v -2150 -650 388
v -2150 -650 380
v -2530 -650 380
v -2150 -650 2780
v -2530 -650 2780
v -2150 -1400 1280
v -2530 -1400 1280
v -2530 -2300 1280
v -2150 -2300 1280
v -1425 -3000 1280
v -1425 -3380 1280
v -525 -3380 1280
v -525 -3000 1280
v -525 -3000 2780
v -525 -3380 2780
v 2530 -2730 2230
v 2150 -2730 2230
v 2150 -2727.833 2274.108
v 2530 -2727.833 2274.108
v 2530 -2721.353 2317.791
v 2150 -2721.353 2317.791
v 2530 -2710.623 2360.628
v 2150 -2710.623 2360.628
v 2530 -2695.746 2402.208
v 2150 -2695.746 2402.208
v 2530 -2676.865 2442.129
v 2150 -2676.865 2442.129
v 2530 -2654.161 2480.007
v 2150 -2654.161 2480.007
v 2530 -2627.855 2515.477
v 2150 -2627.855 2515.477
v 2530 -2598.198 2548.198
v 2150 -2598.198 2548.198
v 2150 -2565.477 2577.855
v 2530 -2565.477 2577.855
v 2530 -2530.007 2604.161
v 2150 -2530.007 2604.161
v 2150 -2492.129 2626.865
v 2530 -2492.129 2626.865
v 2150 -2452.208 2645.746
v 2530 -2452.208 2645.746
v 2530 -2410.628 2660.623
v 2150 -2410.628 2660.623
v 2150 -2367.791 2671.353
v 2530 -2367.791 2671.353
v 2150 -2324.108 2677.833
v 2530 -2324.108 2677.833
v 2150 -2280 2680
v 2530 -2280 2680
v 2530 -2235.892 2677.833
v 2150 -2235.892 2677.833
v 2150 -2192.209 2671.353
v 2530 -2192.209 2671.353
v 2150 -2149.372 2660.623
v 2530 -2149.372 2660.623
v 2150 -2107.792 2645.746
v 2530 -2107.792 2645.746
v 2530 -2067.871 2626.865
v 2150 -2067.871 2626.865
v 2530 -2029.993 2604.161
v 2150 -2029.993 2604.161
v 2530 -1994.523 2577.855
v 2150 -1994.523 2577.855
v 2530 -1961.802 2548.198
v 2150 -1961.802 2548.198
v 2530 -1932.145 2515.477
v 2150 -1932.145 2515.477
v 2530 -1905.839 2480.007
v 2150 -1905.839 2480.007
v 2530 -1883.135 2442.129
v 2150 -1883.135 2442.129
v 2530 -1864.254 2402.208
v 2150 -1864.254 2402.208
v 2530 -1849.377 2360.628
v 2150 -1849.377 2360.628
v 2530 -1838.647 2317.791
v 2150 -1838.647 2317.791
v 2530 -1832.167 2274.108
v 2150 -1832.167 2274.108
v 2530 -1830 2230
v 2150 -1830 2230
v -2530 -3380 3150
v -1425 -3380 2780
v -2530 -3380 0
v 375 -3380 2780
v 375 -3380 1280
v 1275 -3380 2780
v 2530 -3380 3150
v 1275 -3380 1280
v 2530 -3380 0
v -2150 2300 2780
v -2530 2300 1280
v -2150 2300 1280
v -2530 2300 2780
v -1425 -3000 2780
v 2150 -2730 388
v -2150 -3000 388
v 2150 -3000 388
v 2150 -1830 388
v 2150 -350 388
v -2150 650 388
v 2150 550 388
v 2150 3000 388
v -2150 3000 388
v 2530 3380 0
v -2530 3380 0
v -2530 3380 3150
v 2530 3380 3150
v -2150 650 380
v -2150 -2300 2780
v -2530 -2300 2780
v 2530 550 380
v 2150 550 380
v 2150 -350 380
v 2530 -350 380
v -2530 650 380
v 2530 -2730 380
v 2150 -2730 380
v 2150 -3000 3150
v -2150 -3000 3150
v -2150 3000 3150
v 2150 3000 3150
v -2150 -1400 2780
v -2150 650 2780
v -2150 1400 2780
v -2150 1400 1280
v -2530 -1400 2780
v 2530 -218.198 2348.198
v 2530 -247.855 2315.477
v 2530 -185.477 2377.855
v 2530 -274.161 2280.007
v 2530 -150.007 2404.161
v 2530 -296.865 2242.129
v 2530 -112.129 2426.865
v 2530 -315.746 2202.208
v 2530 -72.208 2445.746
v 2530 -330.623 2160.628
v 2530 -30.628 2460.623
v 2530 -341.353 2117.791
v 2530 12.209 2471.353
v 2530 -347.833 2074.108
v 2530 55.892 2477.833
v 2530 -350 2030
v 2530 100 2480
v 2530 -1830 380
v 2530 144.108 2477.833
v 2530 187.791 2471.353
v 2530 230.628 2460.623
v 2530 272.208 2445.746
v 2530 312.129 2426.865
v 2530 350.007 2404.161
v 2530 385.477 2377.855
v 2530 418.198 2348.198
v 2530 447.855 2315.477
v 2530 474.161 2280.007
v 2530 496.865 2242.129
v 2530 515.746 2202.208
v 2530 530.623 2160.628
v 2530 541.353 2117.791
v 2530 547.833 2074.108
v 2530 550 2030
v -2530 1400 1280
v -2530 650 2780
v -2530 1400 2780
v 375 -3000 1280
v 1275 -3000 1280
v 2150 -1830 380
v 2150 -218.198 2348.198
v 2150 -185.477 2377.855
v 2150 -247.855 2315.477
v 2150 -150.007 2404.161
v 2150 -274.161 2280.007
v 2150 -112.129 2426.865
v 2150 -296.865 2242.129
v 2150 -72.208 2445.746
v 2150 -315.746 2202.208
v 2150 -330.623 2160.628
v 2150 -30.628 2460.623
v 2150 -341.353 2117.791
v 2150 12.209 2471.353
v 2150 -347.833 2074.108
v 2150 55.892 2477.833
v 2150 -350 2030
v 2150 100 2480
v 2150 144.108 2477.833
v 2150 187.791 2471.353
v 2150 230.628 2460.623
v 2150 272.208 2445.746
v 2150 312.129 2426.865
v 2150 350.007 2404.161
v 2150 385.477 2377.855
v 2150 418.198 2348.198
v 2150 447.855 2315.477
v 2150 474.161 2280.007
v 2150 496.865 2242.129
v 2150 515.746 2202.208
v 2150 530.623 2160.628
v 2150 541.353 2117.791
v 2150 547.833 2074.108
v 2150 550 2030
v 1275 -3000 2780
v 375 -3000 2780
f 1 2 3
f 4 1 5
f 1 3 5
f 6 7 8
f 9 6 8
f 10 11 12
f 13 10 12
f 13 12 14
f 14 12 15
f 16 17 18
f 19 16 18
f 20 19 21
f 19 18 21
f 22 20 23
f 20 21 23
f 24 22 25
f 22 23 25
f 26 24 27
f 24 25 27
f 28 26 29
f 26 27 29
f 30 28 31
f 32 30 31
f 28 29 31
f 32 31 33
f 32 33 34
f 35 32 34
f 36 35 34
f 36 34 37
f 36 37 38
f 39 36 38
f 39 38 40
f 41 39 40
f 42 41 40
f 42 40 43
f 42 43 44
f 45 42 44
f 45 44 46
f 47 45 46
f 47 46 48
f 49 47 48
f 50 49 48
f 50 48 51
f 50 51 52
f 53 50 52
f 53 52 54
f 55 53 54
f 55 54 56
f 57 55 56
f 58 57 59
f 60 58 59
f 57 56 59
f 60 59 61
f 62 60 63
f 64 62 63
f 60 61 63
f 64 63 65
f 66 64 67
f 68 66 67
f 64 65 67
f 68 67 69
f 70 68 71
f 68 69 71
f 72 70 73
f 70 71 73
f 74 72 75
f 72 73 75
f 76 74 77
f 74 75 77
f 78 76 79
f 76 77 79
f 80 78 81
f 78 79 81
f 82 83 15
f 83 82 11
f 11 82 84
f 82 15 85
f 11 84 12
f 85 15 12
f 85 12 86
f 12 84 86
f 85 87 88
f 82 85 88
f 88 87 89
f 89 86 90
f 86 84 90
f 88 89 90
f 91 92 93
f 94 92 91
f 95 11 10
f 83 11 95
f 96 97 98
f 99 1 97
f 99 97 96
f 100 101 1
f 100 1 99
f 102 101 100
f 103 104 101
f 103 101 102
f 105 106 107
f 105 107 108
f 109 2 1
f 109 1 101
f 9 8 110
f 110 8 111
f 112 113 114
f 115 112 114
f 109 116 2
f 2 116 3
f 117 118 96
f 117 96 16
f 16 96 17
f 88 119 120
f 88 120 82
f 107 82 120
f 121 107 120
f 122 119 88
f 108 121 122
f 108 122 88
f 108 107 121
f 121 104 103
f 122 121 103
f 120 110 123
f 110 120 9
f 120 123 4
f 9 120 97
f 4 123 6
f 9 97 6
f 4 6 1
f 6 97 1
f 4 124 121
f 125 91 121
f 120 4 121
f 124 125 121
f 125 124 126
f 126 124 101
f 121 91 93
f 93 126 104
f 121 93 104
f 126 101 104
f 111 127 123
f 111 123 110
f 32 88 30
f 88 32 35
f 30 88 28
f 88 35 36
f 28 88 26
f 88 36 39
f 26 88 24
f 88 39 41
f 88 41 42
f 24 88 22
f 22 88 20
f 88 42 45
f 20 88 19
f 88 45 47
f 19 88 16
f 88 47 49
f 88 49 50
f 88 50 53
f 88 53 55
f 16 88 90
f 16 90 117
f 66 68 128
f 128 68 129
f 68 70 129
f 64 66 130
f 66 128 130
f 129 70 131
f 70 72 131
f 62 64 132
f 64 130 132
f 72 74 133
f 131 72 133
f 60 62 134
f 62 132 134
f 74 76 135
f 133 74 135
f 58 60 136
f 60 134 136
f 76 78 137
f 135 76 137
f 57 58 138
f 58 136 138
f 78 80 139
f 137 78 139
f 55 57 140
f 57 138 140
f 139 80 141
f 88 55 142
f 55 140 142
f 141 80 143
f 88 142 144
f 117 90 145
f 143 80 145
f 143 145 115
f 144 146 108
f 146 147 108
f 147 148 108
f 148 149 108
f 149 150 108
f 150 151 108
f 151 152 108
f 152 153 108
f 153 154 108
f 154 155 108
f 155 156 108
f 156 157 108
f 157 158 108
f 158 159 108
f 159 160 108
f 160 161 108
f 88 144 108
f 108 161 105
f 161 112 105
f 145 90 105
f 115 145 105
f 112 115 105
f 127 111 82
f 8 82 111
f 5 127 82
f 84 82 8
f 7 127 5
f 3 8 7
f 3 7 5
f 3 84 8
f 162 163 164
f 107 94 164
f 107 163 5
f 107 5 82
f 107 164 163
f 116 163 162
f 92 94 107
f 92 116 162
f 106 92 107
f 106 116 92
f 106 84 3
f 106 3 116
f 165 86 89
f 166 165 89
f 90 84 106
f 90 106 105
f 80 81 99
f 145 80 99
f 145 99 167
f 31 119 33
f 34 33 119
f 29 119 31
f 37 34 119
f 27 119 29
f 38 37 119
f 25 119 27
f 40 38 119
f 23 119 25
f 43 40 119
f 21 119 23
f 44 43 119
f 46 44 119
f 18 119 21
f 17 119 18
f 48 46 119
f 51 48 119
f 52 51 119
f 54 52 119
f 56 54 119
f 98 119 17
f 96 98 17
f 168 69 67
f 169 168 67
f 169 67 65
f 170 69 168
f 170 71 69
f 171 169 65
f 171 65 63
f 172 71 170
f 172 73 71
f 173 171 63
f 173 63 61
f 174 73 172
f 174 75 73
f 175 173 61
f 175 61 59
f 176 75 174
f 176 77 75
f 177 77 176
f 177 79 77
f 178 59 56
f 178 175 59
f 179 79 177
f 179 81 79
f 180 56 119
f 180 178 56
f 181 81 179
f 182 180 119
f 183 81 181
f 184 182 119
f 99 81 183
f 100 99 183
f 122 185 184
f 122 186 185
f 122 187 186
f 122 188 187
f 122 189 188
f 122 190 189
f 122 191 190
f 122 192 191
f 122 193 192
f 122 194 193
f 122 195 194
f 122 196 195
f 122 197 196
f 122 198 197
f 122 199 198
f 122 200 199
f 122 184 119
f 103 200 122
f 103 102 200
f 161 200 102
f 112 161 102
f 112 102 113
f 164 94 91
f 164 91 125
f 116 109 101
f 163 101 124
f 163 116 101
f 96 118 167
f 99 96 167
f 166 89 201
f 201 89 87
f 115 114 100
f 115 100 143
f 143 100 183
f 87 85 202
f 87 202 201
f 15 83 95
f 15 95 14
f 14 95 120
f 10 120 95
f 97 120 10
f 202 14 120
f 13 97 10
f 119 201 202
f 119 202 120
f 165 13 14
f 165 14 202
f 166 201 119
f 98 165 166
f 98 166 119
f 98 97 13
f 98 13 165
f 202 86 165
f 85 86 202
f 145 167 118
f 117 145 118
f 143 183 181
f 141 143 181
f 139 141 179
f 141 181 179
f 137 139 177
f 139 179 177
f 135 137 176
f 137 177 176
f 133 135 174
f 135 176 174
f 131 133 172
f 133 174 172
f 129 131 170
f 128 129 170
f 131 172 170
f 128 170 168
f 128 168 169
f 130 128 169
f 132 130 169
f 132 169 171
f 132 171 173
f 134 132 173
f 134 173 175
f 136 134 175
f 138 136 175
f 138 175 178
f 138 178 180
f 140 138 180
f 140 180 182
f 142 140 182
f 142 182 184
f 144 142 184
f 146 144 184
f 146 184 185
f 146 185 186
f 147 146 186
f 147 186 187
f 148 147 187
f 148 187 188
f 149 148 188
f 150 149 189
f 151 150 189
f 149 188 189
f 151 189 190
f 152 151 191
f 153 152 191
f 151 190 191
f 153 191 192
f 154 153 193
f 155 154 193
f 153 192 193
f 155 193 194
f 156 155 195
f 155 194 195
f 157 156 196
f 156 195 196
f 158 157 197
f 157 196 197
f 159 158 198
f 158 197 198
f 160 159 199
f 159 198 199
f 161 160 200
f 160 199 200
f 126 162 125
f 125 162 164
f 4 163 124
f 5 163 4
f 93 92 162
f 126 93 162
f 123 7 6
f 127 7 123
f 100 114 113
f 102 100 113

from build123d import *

# Parameters (mm, degrees)
F0_W      = 5060
F0_H      = 6760
F1_DEPTH  = 3150
F2_T      = -380
F3_W      = 1300
F3_H      = 2400
F3_W_2    = 900
F3_H_2    = 1500
F4_DEPTH  = 500
F5_W      = 900
F5_H      = 1500
F6_DEPTH  = 500
F8_DEPTH  = 380.001
F9_W      = 4300
F9_H      = 6000
F10_DEPTH = 8


with BuildPart() as f1:
    # F0 (on Top) → F1 (new body)
    with BuildSketch(Plane.XY):
        Rectangle(F0_W, F0_H)
    extrude(amount=F1_DEPTH)

    # F2
    f2_openings = [f1.faces().sort_by_distance(p)[0] for p in [
        (0, 0, 3150),
    ]]
    offset(amount=F2_T, openings=f2_openings)

    # F3 (on face) → F4 (cut)
    with BuildSketch(Plane(origin=(-2530, 0, 0), x_dir=(0, -1, 0), z_dir=(-1, 0, 0))):
        with Locations((0, 1580)):
            Rectangle(F3_W, F3_H)
        with Locations((-1850, 2030)):
            Rectangle(F3_W_2, F3_H_2)
        with Locations((1850, 2030)):
            Rectangle(F3_W_2, F3_H_2)
    extrude(amount=-F4_DEPTH, mode=Mode.SUBTRACT)

    # F5 (on face) → F6 (cut)
    with BuildSketch(Plane.XZ.offset(3380)):
        with Locations((-975, 2030)):
            Rectangle(F5_W, F5_H)
        with Locations((825, 2030)):
            Rectangle(F5_W, F5_H)
    extrude(amount=-F6_DEPTH, mode=Mode.SUBTRACT)

    # F7 (on face) → F8 (cut, through all)
    with BuildSketch(Plane(origin=(2150, 0, 0), x_dir=(0, -1, 0), z_dir=(-1, 0, 0))):
        with BuildLine():
            Line((-550, 2030), (-550, 380))
            Line((-550, 380), (350, 380))
            Line((350, 380), (350, 2030))
            ThreePointArc((350, 2030), (-100, 2480), (-550, 2030))
        make_face()
        with BuildLine():
            Line((1830, 2230), (1830, 380))
            Line((1830, 380), (2730, 380))
            Line((2730, 380), (2730, 2230))
            ThreePointArc((2730, 2230), (2280, 2680), (1830, 2230))
        make_face()
    extrude(amount=-F8_DEPTH, mode=Mode.SUBTRACT)

    # F9 (on face) → F10 (join)
    with BuildSketch(Plane.XY.offset(380)):
        Rectangle(F9_W, F9_H)
    extrude(amount=F10_DEPTH)


solid = f1.part
